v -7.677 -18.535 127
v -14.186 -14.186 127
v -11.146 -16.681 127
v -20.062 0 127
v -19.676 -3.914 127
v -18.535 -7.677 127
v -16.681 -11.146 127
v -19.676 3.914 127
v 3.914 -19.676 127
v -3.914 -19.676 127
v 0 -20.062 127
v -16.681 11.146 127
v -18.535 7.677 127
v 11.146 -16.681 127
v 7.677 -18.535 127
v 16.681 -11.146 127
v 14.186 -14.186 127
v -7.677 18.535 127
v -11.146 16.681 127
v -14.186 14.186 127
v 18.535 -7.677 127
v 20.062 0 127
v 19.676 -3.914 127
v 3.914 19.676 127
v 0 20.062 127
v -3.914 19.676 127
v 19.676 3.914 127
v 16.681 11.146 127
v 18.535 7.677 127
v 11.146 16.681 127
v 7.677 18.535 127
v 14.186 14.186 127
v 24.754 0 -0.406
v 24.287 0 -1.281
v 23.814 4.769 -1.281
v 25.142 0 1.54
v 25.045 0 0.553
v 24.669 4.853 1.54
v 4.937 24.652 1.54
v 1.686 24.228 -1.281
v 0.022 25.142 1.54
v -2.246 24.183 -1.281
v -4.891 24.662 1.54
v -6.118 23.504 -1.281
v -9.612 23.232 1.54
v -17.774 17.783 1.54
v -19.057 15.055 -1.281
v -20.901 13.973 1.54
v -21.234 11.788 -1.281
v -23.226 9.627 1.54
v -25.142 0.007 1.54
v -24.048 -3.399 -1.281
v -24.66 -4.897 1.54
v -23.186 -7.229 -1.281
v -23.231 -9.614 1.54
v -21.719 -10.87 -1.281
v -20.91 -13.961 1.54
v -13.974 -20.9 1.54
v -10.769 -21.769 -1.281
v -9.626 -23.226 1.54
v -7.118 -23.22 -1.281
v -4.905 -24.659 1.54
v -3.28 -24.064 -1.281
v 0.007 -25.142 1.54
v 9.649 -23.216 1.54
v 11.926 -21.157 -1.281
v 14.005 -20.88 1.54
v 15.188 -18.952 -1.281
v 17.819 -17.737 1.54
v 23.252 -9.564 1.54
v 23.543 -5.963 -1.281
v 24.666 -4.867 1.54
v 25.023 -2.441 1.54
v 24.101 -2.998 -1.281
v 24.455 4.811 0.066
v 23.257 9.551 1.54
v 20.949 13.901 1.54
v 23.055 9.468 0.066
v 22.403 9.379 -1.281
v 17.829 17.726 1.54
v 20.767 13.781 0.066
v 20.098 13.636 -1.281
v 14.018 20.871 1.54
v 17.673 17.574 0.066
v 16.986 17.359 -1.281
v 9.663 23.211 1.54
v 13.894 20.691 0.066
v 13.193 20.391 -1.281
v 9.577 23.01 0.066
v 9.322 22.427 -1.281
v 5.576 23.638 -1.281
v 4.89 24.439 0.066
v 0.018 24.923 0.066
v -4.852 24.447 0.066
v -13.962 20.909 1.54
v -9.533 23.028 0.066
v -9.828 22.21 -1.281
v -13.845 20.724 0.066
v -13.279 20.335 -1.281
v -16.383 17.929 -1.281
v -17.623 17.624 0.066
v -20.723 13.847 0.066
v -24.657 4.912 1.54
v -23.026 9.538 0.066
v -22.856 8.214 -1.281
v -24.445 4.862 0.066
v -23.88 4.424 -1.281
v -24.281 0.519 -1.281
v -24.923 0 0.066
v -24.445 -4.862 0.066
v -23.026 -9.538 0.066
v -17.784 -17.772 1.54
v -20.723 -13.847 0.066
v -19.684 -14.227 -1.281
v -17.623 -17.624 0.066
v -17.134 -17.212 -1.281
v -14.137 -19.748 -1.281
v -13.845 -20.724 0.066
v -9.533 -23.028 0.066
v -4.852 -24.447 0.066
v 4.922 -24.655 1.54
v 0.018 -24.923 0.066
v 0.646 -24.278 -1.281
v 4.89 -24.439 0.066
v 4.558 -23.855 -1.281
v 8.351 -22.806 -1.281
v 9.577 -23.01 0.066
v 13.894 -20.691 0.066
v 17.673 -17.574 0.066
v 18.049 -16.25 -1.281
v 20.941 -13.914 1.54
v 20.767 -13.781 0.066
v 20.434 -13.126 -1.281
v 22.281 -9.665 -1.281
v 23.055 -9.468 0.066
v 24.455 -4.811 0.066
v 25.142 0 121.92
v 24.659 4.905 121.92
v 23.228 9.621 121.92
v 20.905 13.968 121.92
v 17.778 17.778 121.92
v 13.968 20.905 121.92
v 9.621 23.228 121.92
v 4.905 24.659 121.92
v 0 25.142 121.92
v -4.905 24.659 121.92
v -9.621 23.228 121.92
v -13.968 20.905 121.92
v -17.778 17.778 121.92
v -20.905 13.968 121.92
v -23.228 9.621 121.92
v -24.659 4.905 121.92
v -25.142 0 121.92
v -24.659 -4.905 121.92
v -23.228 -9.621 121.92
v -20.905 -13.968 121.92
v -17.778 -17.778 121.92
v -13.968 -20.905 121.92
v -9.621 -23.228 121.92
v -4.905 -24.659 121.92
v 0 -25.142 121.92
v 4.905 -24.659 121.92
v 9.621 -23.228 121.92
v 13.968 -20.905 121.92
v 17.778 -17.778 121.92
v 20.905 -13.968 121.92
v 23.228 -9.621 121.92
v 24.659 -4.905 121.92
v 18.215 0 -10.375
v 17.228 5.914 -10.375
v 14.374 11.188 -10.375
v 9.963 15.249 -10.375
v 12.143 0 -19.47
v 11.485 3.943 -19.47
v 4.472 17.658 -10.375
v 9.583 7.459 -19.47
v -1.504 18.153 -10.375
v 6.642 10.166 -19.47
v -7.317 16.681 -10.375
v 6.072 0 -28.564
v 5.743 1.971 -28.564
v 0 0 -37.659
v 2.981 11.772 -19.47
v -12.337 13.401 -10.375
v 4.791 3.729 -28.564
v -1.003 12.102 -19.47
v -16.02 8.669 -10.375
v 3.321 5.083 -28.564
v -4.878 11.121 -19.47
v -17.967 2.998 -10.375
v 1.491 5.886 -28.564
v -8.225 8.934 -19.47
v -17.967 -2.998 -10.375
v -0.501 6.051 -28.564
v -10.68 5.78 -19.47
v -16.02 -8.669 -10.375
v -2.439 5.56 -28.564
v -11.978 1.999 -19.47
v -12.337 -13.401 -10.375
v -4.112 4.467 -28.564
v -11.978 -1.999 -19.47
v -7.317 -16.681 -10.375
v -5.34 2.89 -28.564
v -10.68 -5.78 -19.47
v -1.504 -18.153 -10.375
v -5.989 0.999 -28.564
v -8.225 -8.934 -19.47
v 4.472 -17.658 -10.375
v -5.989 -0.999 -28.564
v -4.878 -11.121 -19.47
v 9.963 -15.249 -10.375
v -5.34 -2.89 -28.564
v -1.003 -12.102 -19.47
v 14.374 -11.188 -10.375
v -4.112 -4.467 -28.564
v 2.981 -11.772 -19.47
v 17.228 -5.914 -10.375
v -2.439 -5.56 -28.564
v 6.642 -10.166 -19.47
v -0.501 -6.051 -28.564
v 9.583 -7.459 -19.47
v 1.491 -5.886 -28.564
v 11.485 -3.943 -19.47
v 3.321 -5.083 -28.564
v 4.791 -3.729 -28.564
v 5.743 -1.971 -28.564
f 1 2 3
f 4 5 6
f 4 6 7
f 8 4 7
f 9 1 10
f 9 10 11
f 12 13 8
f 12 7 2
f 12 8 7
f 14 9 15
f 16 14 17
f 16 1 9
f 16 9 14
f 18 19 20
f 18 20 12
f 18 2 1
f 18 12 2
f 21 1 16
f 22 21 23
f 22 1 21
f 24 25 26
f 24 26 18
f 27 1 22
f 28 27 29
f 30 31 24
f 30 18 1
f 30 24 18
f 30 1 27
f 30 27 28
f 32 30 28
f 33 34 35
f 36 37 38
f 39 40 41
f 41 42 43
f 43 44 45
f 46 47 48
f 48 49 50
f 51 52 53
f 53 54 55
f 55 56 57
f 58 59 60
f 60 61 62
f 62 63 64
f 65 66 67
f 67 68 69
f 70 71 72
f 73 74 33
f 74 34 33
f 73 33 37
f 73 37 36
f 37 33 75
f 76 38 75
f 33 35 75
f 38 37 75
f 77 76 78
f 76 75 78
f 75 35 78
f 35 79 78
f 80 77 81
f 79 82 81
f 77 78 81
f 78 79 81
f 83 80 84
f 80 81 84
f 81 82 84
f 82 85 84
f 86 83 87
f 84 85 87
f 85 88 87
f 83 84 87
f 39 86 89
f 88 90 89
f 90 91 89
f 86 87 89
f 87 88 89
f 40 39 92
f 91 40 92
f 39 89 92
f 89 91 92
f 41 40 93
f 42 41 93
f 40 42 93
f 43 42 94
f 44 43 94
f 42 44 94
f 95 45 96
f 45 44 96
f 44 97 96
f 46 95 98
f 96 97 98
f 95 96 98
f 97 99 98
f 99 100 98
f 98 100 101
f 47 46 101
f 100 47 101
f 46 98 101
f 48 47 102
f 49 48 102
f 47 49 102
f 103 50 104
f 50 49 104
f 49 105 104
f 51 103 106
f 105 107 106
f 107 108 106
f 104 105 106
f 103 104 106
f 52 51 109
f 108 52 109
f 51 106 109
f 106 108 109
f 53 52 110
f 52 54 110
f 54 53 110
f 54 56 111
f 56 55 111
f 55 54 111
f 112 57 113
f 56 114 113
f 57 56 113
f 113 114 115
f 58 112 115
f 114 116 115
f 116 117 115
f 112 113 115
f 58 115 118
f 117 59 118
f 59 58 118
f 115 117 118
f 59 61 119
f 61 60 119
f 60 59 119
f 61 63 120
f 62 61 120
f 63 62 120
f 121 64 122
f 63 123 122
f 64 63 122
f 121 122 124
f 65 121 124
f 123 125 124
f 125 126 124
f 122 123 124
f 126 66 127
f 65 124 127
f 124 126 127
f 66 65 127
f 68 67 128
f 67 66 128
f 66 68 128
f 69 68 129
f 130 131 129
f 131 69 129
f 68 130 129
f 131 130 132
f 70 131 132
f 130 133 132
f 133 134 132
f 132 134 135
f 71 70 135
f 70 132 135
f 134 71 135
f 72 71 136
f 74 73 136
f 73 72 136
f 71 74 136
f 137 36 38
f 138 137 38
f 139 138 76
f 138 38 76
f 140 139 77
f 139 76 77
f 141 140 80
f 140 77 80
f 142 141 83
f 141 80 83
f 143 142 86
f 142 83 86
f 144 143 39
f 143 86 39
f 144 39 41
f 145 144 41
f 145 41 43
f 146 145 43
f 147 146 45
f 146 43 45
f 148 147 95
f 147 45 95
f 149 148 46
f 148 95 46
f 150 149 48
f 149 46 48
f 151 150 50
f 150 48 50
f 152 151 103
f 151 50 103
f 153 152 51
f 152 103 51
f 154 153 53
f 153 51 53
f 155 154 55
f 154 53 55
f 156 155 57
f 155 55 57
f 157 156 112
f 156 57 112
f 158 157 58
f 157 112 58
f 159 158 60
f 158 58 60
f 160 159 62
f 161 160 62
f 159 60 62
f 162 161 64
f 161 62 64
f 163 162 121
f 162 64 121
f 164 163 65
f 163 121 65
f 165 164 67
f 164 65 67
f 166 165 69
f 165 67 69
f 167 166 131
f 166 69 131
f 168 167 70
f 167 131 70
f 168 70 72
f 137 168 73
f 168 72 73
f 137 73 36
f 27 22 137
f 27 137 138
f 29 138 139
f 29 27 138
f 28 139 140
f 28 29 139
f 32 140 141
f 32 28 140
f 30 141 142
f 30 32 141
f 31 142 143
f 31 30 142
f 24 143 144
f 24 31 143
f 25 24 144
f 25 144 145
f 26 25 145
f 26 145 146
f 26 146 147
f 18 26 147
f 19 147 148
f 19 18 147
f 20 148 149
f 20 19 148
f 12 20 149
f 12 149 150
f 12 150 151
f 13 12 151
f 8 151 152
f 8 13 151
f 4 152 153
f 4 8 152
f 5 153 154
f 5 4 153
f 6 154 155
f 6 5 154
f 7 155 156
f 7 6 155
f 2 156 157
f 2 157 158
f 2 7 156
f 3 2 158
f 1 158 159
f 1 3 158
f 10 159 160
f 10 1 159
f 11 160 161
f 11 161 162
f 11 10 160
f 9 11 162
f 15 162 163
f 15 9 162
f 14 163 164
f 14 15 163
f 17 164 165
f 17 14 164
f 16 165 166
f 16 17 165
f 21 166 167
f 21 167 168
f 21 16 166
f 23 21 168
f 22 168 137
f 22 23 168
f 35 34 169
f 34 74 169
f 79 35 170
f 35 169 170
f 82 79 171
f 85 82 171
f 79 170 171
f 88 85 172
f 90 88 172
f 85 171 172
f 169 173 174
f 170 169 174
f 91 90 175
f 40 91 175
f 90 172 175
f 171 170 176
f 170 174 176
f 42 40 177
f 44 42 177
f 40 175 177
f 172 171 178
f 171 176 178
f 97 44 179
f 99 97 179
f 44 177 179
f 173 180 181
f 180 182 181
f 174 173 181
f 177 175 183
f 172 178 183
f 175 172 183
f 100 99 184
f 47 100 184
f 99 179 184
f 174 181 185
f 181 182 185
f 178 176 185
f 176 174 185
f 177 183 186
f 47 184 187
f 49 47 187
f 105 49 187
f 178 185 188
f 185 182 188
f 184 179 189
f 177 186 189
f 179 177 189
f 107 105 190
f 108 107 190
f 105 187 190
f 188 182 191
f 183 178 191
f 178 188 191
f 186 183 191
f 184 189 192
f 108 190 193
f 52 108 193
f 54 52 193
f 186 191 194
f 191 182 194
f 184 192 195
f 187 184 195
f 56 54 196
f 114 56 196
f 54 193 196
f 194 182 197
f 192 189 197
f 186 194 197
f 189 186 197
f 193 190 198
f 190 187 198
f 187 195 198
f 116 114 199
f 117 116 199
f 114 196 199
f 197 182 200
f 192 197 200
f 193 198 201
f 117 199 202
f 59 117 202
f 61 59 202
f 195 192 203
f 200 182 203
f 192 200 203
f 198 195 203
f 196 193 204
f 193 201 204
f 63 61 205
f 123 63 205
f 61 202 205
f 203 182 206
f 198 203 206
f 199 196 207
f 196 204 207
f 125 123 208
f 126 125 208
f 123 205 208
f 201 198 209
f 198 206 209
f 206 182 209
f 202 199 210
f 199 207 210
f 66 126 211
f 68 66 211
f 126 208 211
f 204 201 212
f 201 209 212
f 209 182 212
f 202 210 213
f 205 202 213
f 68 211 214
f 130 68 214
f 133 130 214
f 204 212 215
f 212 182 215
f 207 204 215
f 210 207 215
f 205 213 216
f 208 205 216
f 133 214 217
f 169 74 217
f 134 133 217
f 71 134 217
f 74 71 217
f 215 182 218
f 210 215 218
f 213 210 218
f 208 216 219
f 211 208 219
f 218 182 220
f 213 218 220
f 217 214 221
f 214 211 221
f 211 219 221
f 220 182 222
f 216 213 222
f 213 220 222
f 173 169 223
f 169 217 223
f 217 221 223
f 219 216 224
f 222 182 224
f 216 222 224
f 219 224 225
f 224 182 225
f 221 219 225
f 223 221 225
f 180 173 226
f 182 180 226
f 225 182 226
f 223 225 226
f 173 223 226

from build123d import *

# Parameters (mm, degrees)
F0_R     = 25.1419011997
F1_DEPTH = 127
F4_R     = 5.08
F5_SIZE  = 5.08


with BuildPart() as f1:
    # F0 (on Top) → F1 (new body)
    with BuildSketch(Plane.XY):
        Circle(F0_R)
    extrude(amount=F1_DEPTH)

    # F0 (on Top) → F3 section 0
    with BuildSketch(Plane.XY, mode=Mode.PRIVATE) as f3_s0:
        Circle(F0_R)
    loft([f3_s0.sketch, Vertex(0, 0, -37.6585572958)])

    # F4
    f4_edges = [f1.edges().sort_by_distance(p)[0] for p in [
        (-25.141901, 0, 0),
    ]]
    fillet(f4_edges, radius=F4_R)

    # F5
    f5_edges = [f1.edges().sort_by_distance(p)[0] for p in [
        (-25.141901, 0, 127),
    ]]
    chamfer(f5_edges, length=F5_SIZE)


solid = f1.part
